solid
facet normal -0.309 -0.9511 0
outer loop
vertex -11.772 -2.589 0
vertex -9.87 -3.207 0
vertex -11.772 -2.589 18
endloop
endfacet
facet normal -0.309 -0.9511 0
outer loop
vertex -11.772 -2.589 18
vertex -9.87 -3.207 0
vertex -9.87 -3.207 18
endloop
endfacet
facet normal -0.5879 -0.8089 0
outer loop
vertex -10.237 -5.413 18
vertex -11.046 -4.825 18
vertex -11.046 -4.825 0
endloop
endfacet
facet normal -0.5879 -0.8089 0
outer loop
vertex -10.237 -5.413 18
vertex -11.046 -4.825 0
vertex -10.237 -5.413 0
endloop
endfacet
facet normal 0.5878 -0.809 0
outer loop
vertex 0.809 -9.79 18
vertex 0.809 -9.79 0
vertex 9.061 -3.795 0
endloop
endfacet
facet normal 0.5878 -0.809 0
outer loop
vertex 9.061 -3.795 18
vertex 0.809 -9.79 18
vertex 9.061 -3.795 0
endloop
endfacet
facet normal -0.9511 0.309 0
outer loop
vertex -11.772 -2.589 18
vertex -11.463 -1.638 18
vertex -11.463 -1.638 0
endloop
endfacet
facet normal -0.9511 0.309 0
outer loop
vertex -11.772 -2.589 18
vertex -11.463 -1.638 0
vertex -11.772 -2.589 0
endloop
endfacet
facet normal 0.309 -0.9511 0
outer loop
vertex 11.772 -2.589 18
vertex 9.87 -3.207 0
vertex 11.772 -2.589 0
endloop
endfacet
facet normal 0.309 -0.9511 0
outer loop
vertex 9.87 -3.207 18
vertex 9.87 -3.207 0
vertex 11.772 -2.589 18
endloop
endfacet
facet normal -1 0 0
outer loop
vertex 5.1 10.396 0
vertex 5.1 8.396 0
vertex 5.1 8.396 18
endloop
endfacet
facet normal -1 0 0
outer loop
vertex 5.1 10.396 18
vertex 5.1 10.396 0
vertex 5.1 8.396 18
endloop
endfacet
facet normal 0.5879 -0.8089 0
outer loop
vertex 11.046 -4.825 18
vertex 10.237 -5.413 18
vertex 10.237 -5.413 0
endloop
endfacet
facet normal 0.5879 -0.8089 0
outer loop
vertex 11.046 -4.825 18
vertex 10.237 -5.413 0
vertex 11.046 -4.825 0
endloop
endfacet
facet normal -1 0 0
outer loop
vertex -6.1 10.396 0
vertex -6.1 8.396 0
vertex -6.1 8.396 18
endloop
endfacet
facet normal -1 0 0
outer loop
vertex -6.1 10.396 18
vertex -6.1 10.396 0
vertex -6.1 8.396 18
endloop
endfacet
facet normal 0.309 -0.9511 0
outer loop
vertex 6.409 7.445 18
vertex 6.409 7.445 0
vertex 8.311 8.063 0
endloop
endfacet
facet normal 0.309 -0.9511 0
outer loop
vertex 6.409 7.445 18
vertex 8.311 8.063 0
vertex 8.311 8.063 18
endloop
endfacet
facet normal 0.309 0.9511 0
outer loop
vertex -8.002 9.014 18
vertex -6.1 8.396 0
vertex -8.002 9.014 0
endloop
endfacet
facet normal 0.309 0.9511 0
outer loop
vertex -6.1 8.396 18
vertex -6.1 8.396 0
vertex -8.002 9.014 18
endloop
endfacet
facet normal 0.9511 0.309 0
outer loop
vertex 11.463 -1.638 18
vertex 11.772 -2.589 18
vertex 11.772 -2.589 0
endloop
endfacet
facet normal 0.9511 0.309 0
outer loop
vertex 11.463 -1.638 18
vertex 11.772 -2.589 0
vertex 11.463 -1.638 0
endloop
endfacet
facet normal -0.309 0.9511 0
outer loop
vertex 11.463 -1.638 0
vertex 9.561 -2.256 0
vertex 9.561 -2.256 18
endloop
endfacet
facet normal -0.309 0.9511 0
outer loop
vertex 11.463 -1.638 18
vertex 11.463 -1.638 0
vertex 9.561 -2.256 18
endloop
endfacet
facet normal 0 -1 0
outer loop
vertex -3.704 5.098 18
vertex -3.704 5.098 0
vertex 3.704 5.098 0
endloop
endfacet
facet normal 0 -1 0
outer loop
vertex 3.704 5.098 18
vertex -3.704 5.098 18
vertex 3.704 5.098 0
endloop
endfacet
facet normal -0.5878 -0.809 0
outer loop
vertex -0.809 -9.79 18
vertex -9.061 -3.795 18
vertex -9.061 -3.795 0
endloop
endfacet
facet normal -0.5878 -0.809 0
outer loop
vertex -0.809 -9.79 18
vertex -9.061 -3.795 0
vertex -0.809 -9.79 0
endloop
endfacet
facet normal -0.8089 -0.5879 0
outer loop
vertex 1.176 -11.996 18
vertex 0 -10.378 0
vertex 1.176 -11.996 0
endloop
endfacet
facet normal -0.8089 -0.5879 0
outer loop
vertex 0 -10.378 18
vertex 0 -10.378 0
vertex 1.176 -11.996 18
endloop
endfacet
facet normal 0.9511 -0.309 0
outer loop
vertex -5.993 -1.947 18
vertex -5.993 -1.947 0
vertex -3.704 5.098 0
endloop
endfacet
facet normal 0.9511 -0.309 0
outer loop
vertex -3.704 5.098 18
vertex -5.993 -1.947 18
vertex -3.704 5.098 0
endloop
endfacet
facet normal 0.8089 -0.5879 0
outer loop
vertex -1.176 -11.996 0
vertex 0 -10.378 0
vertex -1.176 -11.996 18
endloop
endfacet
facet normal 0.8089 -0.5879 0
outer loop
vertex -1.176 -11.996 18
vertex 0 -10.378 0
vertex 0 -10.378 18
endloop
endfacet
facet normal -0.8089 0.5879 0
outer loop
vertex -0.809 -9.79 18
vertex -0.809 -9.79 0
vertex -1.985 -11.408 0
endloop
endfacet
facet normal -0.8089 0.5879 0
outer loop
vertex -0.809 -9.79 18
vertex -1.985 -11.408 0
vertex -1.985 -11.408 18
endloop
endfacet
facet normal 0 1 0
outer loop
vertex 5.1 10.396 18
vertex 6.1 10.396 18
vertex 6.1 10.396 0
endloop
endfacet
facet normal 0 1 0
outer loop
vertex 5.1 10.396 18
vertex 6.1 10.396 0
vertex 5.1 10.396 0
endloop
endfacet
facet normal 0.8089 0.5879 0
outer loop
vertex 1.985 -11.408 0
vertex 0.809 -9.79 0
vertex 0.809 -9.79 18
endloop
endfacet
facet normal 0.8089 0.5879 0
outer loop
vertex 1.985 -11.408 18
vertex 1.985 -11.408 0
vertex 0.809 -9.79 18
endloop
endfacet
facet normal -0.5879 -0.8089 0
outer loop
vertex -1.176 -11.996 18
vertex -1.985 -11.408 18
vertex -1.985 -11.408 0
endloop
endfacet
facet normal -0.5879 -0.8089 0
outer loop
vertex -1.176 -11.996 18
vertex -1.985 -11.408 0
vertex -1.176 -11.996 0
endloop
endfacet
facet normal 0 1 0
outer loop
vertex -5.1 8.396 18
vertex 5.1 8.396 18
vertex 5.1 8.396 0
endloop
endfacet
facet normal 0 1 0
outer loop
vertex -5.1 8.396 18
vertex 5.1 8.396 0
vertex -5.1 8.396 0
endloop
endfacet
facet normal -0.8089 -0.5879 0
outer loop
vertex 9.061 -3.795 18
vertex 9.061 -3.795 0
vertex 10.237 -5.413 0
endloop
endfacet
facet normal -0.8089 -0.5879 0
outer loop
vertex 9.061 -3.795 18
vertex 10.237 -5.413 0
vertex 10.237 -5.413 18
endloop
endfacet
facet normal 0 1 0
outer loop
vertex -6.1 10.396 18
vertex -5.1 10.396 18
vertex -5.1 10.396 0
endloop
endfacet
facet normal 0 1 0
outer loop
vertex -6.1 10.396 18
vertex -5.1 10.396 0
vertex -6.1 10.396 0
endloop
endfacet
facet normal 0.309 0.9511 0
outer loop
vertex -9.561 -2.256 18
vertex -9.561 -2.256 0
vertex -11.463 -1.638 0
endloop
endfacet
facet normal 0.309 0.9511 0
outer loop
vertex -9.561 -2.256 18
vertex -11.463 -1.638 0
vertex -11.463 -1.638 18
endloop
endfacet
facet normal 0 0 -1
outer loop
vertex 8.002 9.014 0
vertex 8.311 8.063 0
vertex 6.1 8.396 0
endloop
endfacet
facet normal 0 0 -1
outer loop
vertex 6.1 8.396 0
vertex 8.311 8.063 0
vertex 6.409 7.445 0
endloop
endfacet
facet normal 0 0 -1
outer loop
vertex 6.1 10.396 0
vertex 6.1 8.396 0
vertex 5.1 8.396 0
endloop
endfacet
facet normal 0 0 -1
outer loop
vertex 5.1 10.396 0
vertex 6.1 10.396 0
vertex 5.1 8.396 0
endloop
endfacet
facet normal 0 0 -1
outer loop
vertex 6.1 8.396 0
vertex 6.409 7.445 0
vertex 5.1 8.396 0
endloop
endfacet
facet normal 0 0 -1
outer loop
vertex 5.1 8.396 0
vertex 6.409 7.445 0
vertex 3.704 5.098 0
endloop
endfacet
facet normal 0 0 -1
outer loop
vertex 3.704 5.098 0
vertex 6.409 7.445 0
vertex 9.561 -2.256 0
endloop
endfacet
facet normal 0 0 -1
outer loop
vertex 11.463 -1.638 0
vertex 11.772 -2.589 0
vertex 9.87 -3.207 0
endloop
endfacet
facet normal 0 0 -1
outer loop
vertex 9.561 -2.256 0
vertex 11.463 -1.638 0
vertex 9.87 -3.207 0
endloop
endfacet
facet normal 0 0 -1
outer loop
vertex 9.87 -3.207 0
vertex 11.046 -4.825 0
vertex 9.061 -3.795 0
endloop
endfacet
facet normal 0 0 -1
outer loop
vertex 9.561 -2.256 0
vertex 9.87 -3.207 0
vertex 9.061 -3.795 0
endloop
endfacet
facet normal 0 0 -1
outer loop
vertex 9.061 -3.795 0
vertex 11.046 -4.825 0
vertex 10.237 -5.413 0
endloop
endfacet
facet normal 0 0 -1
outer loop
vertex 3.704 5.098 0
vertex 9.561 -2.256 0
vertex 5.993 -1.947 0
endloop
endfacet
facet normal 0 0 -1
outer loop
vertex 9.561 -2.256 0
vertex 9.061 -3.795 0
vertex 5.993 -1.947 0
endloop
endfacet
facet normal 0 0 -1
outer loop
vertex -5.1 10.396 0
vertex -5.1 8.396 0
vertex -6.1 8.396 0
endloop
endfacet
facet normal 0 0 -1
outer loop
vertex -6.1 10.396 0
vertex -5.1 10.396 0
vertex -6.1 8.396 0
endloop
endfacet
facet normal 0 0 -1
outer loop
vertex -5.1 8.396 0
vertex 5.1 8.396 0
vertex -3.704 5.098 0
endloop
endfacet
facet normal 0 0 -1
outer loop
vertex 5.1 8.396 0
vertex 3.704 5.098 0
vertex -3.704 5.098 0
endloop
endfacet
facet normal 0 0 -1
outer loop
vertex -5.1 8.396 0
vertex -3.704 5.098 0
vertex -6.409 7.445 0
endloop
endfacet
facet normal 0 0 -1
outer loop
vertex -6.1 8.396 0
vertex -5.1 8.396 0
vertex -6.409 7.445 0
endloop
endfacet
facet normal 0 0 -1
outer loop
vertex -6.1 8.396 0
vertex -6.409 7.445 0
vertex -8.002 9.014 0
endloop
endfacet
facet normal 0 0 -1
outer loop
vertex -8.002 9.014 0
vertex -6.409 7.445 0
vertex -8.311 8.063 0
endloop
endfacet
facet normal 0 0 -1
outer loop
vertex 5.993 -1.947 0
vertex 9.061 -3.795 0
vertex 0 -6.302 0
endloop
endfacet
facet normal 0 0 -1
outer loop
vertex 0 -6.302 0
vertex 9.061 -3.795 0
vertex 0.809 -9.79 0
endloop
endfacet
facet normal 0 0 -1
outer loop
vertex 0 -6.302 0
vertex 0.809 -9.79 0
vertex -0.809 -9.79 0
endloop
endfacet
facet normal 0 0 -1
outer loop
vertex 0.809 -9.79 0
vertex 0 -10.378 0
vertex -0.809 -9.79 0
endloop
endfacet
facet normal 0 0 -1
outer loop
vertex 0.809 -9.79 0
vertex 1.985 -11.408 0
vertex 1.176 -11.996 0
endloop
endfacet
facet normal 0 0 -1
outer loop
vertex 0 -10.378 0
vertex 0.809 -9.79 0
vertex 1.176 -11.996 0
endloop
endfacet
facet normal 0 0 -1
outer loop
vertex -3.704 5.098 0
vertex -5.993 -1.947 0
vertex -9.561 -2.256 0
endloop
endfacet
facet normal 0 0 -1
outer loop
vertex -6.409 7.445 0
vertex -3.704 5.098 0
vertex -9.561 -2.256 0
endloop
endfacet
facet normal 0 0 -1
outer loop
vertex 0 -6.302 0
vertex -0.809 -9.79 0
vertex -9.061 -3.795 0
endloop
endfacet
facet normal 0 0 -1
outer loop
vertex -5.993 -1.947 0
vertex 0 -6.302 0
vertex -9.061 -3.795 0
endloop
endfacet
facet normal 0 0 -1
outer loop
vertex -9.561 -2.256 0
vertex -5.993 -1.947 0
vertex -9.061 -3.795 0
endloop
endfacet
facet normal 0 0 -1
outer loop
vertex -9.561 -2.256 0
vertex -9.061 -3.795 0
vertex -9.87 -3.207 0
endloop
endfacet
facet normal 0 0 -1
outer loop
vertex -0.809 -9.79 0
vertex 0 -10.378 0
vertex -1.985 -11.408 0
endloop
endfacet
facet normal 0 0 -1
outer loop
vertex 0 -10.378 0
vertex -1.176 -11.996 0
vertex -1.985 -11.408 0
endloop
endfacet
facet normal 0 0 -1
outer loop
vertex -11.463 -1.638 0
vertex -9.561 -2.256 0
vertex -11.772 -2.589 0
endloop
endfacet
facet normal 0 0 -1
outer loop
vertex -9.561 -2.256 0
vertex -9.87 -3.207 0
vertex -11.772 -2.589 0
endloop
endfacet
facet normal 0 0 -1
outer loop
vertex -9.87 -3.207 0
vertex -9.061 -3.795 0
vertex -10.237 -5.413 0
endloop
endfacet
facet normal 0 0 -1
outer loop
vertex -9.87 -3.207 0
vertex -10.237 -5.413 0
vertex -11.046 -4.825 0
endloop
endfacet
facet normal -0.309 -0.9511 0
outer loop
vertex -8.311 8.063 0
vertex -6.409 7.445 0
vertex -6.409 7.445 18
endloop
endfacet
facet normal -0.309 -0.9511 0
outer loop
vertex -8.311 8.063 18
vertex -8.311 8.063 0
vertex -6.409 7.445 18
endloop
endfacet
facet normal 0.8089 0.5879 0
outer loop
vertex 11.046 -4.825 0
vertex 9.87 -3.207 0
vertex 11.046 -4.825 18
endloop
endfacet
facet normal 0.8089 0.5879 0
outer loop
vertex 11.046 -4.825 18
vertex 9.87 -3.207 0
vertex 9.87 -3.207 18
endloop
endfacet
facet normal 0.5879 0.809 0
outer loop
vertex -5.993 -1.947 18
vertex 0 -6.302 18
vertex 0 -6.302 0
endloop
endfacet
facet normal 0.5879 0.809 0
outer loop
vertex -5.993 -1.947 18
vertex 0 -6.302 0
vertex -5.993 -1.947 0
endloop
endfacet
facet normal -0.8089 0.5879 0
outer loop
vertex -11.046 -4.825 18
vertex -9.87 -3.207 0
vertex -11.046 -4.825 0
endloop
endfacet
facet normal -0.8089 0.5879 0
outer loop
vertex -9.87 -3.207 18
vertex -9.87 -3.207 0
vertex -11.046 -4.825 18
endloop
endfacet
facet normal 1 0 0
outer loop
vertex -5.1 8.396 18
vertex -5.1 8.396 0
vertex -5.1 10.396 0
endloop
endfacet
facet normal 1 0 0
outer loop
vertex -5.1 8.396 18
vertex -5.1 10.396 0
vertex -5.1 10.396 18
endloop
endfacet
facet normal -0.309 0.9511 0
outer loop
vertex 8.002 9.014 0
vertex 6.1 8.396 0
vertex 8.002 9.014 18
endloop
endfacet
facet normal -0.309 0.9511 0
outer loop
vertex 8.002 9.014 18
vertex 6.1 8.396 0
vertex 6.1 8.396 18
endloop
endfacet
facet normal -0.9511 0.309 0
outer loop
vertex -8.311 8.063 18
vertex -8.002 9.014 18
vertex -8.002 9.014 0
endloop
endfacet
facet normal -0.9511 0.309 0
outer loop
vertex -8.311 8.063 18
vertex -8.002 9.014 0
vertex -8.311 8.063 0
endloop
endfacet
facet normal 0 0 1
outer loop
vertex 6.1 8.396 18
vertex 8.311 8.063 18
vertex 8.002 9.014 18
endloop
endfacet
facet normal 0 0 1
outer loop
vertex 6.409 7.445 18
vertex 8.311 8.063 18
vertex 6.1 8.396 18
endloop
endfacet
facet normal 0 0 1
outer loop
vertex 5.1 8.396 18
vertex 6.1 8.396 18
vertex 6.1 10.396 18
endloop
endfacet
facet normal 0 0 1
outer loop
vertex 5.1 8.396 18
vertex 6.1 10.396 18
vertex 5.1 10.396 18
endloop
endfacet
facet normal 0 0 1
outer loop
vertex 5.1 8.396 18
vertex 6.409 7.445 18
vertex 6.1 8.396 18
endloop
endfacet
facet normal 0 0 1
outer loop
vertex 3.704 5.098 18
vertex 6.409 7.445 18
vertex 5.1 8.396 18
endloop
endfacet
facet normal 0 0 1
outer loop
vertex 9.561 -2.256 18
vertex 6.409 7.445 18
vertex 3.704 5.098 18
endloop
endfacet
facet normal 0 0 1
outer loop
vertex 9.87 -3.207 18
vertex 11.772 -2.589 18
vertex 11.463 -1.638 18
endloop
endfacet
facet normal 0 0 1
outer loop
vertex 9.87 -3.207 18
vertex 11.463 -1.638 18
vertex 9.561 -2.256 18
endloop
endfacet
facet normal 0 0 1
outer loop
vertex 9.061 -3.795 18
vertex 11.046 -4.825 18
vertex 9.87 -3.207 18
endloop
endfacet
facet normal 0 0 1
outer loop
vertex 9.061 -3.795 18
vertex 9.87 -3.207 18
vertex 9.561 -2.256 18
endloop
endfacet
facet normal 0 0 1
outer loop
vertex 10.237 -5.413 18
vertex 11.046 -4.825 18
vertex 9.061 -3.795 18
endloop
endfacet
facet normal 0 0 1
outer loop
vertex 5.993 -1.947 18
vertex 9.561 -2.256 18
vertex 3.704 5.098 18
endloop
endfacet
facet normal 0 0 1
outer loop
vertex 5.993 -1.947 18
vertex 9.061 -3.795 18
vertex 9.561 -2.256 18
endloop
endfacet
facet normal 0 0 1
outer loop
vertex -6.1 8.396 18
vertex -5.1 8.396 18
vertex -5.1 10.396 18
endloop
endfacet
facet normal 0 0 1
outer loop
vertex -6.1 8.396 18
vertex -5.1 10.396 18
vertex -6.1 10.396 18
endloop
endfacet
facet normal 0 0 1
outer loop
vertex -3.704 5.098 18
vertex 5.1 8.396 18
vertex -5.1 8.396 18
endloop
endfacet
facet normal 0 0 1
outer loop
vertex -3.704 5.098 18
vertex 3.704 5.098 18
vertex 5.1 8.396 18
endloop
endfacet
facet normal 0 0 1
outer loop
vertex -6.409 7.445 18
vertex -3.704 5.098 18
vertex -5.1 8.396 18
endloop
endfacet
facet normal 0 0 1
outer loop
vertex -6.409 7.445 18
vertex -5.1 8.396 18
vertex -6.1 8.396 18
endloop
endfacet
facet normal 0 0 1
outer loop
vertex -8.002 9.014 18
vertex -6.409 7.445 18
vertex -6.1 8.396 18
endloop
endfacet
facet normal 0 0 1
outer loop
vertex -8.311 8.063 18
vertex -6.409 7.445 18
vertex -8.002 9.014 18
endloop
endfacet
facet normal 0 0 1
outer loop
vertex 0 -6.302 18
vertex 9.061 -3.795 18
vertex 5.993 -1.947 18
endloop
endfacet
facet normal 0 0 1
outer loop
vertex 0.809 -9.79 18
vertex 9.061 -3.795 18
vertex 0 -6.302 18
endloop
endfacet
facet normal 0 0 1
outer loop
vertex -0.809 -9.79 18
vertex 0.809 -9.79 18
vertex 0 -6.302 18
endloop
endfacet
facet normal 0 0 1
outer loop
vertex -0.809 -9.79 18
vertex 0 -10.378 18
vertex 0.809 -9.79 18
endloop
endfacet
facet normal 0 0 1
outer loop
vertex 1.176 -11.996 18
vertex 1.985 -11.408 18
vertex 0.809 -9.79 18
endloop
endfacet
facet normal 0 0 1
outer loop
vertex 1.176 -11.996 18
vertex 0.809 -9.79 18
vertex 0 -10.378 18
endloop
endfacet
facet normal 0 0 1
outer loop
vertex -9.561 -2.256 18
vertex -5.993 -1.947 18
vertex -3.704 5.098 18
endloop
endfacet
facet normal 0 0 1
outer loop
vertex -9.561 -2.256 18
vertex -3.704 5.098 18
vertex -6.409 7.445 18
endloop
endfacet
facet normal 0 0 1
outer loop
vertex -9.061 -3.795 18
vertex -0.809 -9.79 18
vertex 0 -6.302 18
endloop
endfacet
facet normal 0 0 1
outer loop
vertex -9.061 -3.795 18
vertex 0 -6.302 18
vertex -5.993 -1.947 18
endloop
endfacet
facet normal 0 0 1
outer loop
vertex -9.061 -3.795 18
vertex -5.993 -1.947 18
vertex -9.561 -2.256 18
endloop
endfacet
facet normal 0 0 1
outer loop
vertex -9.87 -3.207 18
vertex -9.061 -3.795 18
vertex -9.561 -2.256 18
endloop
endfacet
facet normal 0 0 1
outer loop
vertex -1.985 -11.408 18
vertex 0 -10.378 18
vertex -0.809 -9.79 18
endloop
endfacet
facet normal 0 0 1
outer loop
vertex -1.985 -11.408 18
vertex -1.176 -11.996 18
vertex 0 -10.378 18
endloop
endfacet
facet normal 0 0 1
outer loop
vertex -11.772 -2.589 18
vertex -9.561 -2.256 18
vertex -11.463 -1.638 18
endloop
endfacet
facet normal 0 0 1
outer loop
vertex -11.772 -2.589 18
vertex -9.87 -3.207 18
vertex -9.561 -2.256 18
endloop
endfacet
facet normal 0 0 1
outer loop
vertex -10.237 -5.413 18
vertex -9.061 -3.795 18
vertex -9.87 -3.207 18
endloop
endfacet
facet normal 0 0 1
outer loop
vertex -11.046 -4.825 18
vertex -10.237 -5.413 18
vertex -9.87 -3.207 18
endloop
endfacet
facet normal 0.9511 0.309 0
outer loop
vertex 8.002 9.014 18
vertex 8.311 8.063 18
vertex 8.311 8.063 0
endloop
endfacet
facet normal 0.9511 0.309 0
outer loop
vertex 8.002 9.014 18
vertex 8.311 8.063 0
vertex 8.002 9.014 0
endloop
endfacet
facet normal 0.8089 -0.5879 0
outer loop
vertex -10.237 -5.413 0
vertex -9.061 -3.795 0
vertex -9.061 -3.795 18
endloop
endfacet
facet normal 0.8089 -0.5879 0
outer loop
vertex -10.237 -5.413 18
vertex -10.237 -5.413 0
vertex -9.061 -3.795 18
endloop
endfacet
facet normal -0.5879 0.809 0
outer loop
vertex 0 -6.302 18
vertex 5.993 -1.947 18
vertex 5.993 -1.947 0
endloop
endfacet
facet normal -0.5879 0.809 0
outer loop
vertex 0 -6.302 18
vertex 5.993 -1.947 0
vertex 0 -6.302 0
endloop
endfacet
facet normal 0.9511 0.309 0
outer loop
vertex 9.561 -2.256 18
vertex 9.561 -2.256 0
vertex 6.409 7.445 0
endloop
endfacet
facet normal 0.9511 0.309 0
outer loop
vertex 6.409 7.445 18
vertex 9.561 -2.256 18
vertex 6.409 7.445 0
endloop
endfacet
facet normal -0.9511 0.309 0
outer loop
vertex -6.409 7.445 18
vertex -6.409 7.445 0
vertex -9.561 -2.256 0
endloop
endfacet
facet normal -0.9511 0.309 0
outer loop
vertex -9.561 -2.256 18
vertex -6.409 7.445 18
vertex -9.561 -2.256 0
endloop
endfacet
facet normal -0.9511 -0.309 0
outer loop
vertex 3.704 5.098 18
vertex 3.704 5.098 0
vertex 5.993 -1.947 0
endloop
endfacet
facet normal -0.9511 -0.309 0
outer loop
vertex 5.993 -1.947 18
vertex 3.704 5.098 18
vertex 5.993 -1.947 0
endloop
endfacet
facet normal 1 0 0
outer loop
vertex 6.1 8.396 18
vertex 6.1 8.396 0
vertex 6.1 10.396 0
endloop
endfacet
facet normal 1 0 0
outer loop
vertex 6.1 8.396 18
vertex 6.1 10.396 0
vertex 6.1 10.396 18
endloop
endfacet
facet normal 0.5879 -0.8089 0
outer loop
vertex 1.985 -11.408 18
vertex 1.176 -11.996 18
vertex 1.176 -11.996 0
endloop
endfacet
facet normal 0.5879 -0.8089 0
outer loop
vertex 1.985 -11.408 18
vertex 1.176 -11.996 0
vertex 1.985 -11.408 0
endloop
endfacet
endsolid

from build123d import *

# Parameters (mm, degrees)
F1_DEPTH  = 18
F2_W      = 1
F2_H      = 18
F3_DEPTH  = 2
F4_W      = 1
F4_H      = 18
F5_DEPTH  = 2
F6_W      = 1
F6_H      = 18
F7_DEPTH  = 2
F8_W      = 1
F8_H      = 18
F9_DEPTH  = 2
F10_W     = 1
F10_H     = 18
F11_DEPTH = 2


with BuildPart() as f1:
    # F0 (on Top) → F1 (new body)
    with BuildSketch(Plane.XY):
        Polygon((0, -10.3779398619), (9.8700073314, -3.2069597839), (6.1, 8.3959297149), (-6.1, 8.3959297149), (-9.8700073314, -3.2069597839), align=None)
        Polygon((-5.9933346782, -1.947352483), (-3.7040845371, 5.0982349887), (3.7040845371, 5.0982349887), (5.9933346782, -1.947352483), (0, -6.3017650113), align=None, mode=Mode.SUBTRACT)
    extrude(amount=F1_DEPTH)

    # F2 (on face) → F3 (join)
    with BuildSketch(Plane(origin=(4.9350036657, -6.7924498229, 0), x_dir=(0.8090169944, 0.5877852523, 0), z_dir=(0.5877852523, -0.8090169944, 0))):
        with Locations((-5.6, 9)):
            Rectangle(F2_W, F2_H)
        with Locations((5.6, 9)):
            Rectangle(F2_W, F2_H)
    extrude(amount=F3_DEPTH)

    # F4 (on face) → F5 (join)
    with BuildSketch(Plane(origin=(-4.9350036657, -6.7924498229, 0), x_dir=(0.8090169944, -0.5877852523, 0), z_dir=(-0.5877852523, -0.8090169944, 0))):
        with Locations((5.6, 9)):
            Rectangle(F4_W, F4_H)
        with Locations((-5.6, 9)):
            Rectangle(F4_W, F4_H)
    extrude(amount=F5_DEPTH)

    # F6 (on face) → F7 (join)
    with BuildSketch(Plane(origin=(-7.9850036657, 2.5944849655, 0), x_dir=(-0.3090169944, -0.9510565163, 0), z_dir=(-0.9510565163, 0.3090169944, 0))):
        with Locations((5.6, 9)):
            Rectangle(F6_W, F6_H)
        with Locations((-5.6, 9)):
            Rectangle(F6_W, F6_H)
    extrude(amount=F7_DEPTH)

    # F8 (on face) → F9 (join)
    with BuildSketch(Plane(origin=(7.9850036657, 2.5944849655, 0), x_dir=(-0.3090169944, 0.9510565163, 0), z_dir=(0.9510565163, 0.3090169944, 0))):
        with Locations((-5.6, 9)):
            Rectangle(F8_W, F8_H)
        with Locations((5.6, 9)):
            Rectangle(F8_W, F8_H)
    extrude(amount=F9_DEPTH)

    # F10 (on face) → F11 (join)
    with BuildSketch(Plane(origin=(0, 8.3959297149, 0), x_dir=(-1, 0, 0), z_dir=(0, 1, 0))):
        with Locations((5.6, 9)):
            Rectangle(F10_W, F10_H)
        with Locations((-5.6, 9)):
            Rectangle(F10_W, F10_H)
    extrude(amount=F11_DEPTH)


solid = f1.part
